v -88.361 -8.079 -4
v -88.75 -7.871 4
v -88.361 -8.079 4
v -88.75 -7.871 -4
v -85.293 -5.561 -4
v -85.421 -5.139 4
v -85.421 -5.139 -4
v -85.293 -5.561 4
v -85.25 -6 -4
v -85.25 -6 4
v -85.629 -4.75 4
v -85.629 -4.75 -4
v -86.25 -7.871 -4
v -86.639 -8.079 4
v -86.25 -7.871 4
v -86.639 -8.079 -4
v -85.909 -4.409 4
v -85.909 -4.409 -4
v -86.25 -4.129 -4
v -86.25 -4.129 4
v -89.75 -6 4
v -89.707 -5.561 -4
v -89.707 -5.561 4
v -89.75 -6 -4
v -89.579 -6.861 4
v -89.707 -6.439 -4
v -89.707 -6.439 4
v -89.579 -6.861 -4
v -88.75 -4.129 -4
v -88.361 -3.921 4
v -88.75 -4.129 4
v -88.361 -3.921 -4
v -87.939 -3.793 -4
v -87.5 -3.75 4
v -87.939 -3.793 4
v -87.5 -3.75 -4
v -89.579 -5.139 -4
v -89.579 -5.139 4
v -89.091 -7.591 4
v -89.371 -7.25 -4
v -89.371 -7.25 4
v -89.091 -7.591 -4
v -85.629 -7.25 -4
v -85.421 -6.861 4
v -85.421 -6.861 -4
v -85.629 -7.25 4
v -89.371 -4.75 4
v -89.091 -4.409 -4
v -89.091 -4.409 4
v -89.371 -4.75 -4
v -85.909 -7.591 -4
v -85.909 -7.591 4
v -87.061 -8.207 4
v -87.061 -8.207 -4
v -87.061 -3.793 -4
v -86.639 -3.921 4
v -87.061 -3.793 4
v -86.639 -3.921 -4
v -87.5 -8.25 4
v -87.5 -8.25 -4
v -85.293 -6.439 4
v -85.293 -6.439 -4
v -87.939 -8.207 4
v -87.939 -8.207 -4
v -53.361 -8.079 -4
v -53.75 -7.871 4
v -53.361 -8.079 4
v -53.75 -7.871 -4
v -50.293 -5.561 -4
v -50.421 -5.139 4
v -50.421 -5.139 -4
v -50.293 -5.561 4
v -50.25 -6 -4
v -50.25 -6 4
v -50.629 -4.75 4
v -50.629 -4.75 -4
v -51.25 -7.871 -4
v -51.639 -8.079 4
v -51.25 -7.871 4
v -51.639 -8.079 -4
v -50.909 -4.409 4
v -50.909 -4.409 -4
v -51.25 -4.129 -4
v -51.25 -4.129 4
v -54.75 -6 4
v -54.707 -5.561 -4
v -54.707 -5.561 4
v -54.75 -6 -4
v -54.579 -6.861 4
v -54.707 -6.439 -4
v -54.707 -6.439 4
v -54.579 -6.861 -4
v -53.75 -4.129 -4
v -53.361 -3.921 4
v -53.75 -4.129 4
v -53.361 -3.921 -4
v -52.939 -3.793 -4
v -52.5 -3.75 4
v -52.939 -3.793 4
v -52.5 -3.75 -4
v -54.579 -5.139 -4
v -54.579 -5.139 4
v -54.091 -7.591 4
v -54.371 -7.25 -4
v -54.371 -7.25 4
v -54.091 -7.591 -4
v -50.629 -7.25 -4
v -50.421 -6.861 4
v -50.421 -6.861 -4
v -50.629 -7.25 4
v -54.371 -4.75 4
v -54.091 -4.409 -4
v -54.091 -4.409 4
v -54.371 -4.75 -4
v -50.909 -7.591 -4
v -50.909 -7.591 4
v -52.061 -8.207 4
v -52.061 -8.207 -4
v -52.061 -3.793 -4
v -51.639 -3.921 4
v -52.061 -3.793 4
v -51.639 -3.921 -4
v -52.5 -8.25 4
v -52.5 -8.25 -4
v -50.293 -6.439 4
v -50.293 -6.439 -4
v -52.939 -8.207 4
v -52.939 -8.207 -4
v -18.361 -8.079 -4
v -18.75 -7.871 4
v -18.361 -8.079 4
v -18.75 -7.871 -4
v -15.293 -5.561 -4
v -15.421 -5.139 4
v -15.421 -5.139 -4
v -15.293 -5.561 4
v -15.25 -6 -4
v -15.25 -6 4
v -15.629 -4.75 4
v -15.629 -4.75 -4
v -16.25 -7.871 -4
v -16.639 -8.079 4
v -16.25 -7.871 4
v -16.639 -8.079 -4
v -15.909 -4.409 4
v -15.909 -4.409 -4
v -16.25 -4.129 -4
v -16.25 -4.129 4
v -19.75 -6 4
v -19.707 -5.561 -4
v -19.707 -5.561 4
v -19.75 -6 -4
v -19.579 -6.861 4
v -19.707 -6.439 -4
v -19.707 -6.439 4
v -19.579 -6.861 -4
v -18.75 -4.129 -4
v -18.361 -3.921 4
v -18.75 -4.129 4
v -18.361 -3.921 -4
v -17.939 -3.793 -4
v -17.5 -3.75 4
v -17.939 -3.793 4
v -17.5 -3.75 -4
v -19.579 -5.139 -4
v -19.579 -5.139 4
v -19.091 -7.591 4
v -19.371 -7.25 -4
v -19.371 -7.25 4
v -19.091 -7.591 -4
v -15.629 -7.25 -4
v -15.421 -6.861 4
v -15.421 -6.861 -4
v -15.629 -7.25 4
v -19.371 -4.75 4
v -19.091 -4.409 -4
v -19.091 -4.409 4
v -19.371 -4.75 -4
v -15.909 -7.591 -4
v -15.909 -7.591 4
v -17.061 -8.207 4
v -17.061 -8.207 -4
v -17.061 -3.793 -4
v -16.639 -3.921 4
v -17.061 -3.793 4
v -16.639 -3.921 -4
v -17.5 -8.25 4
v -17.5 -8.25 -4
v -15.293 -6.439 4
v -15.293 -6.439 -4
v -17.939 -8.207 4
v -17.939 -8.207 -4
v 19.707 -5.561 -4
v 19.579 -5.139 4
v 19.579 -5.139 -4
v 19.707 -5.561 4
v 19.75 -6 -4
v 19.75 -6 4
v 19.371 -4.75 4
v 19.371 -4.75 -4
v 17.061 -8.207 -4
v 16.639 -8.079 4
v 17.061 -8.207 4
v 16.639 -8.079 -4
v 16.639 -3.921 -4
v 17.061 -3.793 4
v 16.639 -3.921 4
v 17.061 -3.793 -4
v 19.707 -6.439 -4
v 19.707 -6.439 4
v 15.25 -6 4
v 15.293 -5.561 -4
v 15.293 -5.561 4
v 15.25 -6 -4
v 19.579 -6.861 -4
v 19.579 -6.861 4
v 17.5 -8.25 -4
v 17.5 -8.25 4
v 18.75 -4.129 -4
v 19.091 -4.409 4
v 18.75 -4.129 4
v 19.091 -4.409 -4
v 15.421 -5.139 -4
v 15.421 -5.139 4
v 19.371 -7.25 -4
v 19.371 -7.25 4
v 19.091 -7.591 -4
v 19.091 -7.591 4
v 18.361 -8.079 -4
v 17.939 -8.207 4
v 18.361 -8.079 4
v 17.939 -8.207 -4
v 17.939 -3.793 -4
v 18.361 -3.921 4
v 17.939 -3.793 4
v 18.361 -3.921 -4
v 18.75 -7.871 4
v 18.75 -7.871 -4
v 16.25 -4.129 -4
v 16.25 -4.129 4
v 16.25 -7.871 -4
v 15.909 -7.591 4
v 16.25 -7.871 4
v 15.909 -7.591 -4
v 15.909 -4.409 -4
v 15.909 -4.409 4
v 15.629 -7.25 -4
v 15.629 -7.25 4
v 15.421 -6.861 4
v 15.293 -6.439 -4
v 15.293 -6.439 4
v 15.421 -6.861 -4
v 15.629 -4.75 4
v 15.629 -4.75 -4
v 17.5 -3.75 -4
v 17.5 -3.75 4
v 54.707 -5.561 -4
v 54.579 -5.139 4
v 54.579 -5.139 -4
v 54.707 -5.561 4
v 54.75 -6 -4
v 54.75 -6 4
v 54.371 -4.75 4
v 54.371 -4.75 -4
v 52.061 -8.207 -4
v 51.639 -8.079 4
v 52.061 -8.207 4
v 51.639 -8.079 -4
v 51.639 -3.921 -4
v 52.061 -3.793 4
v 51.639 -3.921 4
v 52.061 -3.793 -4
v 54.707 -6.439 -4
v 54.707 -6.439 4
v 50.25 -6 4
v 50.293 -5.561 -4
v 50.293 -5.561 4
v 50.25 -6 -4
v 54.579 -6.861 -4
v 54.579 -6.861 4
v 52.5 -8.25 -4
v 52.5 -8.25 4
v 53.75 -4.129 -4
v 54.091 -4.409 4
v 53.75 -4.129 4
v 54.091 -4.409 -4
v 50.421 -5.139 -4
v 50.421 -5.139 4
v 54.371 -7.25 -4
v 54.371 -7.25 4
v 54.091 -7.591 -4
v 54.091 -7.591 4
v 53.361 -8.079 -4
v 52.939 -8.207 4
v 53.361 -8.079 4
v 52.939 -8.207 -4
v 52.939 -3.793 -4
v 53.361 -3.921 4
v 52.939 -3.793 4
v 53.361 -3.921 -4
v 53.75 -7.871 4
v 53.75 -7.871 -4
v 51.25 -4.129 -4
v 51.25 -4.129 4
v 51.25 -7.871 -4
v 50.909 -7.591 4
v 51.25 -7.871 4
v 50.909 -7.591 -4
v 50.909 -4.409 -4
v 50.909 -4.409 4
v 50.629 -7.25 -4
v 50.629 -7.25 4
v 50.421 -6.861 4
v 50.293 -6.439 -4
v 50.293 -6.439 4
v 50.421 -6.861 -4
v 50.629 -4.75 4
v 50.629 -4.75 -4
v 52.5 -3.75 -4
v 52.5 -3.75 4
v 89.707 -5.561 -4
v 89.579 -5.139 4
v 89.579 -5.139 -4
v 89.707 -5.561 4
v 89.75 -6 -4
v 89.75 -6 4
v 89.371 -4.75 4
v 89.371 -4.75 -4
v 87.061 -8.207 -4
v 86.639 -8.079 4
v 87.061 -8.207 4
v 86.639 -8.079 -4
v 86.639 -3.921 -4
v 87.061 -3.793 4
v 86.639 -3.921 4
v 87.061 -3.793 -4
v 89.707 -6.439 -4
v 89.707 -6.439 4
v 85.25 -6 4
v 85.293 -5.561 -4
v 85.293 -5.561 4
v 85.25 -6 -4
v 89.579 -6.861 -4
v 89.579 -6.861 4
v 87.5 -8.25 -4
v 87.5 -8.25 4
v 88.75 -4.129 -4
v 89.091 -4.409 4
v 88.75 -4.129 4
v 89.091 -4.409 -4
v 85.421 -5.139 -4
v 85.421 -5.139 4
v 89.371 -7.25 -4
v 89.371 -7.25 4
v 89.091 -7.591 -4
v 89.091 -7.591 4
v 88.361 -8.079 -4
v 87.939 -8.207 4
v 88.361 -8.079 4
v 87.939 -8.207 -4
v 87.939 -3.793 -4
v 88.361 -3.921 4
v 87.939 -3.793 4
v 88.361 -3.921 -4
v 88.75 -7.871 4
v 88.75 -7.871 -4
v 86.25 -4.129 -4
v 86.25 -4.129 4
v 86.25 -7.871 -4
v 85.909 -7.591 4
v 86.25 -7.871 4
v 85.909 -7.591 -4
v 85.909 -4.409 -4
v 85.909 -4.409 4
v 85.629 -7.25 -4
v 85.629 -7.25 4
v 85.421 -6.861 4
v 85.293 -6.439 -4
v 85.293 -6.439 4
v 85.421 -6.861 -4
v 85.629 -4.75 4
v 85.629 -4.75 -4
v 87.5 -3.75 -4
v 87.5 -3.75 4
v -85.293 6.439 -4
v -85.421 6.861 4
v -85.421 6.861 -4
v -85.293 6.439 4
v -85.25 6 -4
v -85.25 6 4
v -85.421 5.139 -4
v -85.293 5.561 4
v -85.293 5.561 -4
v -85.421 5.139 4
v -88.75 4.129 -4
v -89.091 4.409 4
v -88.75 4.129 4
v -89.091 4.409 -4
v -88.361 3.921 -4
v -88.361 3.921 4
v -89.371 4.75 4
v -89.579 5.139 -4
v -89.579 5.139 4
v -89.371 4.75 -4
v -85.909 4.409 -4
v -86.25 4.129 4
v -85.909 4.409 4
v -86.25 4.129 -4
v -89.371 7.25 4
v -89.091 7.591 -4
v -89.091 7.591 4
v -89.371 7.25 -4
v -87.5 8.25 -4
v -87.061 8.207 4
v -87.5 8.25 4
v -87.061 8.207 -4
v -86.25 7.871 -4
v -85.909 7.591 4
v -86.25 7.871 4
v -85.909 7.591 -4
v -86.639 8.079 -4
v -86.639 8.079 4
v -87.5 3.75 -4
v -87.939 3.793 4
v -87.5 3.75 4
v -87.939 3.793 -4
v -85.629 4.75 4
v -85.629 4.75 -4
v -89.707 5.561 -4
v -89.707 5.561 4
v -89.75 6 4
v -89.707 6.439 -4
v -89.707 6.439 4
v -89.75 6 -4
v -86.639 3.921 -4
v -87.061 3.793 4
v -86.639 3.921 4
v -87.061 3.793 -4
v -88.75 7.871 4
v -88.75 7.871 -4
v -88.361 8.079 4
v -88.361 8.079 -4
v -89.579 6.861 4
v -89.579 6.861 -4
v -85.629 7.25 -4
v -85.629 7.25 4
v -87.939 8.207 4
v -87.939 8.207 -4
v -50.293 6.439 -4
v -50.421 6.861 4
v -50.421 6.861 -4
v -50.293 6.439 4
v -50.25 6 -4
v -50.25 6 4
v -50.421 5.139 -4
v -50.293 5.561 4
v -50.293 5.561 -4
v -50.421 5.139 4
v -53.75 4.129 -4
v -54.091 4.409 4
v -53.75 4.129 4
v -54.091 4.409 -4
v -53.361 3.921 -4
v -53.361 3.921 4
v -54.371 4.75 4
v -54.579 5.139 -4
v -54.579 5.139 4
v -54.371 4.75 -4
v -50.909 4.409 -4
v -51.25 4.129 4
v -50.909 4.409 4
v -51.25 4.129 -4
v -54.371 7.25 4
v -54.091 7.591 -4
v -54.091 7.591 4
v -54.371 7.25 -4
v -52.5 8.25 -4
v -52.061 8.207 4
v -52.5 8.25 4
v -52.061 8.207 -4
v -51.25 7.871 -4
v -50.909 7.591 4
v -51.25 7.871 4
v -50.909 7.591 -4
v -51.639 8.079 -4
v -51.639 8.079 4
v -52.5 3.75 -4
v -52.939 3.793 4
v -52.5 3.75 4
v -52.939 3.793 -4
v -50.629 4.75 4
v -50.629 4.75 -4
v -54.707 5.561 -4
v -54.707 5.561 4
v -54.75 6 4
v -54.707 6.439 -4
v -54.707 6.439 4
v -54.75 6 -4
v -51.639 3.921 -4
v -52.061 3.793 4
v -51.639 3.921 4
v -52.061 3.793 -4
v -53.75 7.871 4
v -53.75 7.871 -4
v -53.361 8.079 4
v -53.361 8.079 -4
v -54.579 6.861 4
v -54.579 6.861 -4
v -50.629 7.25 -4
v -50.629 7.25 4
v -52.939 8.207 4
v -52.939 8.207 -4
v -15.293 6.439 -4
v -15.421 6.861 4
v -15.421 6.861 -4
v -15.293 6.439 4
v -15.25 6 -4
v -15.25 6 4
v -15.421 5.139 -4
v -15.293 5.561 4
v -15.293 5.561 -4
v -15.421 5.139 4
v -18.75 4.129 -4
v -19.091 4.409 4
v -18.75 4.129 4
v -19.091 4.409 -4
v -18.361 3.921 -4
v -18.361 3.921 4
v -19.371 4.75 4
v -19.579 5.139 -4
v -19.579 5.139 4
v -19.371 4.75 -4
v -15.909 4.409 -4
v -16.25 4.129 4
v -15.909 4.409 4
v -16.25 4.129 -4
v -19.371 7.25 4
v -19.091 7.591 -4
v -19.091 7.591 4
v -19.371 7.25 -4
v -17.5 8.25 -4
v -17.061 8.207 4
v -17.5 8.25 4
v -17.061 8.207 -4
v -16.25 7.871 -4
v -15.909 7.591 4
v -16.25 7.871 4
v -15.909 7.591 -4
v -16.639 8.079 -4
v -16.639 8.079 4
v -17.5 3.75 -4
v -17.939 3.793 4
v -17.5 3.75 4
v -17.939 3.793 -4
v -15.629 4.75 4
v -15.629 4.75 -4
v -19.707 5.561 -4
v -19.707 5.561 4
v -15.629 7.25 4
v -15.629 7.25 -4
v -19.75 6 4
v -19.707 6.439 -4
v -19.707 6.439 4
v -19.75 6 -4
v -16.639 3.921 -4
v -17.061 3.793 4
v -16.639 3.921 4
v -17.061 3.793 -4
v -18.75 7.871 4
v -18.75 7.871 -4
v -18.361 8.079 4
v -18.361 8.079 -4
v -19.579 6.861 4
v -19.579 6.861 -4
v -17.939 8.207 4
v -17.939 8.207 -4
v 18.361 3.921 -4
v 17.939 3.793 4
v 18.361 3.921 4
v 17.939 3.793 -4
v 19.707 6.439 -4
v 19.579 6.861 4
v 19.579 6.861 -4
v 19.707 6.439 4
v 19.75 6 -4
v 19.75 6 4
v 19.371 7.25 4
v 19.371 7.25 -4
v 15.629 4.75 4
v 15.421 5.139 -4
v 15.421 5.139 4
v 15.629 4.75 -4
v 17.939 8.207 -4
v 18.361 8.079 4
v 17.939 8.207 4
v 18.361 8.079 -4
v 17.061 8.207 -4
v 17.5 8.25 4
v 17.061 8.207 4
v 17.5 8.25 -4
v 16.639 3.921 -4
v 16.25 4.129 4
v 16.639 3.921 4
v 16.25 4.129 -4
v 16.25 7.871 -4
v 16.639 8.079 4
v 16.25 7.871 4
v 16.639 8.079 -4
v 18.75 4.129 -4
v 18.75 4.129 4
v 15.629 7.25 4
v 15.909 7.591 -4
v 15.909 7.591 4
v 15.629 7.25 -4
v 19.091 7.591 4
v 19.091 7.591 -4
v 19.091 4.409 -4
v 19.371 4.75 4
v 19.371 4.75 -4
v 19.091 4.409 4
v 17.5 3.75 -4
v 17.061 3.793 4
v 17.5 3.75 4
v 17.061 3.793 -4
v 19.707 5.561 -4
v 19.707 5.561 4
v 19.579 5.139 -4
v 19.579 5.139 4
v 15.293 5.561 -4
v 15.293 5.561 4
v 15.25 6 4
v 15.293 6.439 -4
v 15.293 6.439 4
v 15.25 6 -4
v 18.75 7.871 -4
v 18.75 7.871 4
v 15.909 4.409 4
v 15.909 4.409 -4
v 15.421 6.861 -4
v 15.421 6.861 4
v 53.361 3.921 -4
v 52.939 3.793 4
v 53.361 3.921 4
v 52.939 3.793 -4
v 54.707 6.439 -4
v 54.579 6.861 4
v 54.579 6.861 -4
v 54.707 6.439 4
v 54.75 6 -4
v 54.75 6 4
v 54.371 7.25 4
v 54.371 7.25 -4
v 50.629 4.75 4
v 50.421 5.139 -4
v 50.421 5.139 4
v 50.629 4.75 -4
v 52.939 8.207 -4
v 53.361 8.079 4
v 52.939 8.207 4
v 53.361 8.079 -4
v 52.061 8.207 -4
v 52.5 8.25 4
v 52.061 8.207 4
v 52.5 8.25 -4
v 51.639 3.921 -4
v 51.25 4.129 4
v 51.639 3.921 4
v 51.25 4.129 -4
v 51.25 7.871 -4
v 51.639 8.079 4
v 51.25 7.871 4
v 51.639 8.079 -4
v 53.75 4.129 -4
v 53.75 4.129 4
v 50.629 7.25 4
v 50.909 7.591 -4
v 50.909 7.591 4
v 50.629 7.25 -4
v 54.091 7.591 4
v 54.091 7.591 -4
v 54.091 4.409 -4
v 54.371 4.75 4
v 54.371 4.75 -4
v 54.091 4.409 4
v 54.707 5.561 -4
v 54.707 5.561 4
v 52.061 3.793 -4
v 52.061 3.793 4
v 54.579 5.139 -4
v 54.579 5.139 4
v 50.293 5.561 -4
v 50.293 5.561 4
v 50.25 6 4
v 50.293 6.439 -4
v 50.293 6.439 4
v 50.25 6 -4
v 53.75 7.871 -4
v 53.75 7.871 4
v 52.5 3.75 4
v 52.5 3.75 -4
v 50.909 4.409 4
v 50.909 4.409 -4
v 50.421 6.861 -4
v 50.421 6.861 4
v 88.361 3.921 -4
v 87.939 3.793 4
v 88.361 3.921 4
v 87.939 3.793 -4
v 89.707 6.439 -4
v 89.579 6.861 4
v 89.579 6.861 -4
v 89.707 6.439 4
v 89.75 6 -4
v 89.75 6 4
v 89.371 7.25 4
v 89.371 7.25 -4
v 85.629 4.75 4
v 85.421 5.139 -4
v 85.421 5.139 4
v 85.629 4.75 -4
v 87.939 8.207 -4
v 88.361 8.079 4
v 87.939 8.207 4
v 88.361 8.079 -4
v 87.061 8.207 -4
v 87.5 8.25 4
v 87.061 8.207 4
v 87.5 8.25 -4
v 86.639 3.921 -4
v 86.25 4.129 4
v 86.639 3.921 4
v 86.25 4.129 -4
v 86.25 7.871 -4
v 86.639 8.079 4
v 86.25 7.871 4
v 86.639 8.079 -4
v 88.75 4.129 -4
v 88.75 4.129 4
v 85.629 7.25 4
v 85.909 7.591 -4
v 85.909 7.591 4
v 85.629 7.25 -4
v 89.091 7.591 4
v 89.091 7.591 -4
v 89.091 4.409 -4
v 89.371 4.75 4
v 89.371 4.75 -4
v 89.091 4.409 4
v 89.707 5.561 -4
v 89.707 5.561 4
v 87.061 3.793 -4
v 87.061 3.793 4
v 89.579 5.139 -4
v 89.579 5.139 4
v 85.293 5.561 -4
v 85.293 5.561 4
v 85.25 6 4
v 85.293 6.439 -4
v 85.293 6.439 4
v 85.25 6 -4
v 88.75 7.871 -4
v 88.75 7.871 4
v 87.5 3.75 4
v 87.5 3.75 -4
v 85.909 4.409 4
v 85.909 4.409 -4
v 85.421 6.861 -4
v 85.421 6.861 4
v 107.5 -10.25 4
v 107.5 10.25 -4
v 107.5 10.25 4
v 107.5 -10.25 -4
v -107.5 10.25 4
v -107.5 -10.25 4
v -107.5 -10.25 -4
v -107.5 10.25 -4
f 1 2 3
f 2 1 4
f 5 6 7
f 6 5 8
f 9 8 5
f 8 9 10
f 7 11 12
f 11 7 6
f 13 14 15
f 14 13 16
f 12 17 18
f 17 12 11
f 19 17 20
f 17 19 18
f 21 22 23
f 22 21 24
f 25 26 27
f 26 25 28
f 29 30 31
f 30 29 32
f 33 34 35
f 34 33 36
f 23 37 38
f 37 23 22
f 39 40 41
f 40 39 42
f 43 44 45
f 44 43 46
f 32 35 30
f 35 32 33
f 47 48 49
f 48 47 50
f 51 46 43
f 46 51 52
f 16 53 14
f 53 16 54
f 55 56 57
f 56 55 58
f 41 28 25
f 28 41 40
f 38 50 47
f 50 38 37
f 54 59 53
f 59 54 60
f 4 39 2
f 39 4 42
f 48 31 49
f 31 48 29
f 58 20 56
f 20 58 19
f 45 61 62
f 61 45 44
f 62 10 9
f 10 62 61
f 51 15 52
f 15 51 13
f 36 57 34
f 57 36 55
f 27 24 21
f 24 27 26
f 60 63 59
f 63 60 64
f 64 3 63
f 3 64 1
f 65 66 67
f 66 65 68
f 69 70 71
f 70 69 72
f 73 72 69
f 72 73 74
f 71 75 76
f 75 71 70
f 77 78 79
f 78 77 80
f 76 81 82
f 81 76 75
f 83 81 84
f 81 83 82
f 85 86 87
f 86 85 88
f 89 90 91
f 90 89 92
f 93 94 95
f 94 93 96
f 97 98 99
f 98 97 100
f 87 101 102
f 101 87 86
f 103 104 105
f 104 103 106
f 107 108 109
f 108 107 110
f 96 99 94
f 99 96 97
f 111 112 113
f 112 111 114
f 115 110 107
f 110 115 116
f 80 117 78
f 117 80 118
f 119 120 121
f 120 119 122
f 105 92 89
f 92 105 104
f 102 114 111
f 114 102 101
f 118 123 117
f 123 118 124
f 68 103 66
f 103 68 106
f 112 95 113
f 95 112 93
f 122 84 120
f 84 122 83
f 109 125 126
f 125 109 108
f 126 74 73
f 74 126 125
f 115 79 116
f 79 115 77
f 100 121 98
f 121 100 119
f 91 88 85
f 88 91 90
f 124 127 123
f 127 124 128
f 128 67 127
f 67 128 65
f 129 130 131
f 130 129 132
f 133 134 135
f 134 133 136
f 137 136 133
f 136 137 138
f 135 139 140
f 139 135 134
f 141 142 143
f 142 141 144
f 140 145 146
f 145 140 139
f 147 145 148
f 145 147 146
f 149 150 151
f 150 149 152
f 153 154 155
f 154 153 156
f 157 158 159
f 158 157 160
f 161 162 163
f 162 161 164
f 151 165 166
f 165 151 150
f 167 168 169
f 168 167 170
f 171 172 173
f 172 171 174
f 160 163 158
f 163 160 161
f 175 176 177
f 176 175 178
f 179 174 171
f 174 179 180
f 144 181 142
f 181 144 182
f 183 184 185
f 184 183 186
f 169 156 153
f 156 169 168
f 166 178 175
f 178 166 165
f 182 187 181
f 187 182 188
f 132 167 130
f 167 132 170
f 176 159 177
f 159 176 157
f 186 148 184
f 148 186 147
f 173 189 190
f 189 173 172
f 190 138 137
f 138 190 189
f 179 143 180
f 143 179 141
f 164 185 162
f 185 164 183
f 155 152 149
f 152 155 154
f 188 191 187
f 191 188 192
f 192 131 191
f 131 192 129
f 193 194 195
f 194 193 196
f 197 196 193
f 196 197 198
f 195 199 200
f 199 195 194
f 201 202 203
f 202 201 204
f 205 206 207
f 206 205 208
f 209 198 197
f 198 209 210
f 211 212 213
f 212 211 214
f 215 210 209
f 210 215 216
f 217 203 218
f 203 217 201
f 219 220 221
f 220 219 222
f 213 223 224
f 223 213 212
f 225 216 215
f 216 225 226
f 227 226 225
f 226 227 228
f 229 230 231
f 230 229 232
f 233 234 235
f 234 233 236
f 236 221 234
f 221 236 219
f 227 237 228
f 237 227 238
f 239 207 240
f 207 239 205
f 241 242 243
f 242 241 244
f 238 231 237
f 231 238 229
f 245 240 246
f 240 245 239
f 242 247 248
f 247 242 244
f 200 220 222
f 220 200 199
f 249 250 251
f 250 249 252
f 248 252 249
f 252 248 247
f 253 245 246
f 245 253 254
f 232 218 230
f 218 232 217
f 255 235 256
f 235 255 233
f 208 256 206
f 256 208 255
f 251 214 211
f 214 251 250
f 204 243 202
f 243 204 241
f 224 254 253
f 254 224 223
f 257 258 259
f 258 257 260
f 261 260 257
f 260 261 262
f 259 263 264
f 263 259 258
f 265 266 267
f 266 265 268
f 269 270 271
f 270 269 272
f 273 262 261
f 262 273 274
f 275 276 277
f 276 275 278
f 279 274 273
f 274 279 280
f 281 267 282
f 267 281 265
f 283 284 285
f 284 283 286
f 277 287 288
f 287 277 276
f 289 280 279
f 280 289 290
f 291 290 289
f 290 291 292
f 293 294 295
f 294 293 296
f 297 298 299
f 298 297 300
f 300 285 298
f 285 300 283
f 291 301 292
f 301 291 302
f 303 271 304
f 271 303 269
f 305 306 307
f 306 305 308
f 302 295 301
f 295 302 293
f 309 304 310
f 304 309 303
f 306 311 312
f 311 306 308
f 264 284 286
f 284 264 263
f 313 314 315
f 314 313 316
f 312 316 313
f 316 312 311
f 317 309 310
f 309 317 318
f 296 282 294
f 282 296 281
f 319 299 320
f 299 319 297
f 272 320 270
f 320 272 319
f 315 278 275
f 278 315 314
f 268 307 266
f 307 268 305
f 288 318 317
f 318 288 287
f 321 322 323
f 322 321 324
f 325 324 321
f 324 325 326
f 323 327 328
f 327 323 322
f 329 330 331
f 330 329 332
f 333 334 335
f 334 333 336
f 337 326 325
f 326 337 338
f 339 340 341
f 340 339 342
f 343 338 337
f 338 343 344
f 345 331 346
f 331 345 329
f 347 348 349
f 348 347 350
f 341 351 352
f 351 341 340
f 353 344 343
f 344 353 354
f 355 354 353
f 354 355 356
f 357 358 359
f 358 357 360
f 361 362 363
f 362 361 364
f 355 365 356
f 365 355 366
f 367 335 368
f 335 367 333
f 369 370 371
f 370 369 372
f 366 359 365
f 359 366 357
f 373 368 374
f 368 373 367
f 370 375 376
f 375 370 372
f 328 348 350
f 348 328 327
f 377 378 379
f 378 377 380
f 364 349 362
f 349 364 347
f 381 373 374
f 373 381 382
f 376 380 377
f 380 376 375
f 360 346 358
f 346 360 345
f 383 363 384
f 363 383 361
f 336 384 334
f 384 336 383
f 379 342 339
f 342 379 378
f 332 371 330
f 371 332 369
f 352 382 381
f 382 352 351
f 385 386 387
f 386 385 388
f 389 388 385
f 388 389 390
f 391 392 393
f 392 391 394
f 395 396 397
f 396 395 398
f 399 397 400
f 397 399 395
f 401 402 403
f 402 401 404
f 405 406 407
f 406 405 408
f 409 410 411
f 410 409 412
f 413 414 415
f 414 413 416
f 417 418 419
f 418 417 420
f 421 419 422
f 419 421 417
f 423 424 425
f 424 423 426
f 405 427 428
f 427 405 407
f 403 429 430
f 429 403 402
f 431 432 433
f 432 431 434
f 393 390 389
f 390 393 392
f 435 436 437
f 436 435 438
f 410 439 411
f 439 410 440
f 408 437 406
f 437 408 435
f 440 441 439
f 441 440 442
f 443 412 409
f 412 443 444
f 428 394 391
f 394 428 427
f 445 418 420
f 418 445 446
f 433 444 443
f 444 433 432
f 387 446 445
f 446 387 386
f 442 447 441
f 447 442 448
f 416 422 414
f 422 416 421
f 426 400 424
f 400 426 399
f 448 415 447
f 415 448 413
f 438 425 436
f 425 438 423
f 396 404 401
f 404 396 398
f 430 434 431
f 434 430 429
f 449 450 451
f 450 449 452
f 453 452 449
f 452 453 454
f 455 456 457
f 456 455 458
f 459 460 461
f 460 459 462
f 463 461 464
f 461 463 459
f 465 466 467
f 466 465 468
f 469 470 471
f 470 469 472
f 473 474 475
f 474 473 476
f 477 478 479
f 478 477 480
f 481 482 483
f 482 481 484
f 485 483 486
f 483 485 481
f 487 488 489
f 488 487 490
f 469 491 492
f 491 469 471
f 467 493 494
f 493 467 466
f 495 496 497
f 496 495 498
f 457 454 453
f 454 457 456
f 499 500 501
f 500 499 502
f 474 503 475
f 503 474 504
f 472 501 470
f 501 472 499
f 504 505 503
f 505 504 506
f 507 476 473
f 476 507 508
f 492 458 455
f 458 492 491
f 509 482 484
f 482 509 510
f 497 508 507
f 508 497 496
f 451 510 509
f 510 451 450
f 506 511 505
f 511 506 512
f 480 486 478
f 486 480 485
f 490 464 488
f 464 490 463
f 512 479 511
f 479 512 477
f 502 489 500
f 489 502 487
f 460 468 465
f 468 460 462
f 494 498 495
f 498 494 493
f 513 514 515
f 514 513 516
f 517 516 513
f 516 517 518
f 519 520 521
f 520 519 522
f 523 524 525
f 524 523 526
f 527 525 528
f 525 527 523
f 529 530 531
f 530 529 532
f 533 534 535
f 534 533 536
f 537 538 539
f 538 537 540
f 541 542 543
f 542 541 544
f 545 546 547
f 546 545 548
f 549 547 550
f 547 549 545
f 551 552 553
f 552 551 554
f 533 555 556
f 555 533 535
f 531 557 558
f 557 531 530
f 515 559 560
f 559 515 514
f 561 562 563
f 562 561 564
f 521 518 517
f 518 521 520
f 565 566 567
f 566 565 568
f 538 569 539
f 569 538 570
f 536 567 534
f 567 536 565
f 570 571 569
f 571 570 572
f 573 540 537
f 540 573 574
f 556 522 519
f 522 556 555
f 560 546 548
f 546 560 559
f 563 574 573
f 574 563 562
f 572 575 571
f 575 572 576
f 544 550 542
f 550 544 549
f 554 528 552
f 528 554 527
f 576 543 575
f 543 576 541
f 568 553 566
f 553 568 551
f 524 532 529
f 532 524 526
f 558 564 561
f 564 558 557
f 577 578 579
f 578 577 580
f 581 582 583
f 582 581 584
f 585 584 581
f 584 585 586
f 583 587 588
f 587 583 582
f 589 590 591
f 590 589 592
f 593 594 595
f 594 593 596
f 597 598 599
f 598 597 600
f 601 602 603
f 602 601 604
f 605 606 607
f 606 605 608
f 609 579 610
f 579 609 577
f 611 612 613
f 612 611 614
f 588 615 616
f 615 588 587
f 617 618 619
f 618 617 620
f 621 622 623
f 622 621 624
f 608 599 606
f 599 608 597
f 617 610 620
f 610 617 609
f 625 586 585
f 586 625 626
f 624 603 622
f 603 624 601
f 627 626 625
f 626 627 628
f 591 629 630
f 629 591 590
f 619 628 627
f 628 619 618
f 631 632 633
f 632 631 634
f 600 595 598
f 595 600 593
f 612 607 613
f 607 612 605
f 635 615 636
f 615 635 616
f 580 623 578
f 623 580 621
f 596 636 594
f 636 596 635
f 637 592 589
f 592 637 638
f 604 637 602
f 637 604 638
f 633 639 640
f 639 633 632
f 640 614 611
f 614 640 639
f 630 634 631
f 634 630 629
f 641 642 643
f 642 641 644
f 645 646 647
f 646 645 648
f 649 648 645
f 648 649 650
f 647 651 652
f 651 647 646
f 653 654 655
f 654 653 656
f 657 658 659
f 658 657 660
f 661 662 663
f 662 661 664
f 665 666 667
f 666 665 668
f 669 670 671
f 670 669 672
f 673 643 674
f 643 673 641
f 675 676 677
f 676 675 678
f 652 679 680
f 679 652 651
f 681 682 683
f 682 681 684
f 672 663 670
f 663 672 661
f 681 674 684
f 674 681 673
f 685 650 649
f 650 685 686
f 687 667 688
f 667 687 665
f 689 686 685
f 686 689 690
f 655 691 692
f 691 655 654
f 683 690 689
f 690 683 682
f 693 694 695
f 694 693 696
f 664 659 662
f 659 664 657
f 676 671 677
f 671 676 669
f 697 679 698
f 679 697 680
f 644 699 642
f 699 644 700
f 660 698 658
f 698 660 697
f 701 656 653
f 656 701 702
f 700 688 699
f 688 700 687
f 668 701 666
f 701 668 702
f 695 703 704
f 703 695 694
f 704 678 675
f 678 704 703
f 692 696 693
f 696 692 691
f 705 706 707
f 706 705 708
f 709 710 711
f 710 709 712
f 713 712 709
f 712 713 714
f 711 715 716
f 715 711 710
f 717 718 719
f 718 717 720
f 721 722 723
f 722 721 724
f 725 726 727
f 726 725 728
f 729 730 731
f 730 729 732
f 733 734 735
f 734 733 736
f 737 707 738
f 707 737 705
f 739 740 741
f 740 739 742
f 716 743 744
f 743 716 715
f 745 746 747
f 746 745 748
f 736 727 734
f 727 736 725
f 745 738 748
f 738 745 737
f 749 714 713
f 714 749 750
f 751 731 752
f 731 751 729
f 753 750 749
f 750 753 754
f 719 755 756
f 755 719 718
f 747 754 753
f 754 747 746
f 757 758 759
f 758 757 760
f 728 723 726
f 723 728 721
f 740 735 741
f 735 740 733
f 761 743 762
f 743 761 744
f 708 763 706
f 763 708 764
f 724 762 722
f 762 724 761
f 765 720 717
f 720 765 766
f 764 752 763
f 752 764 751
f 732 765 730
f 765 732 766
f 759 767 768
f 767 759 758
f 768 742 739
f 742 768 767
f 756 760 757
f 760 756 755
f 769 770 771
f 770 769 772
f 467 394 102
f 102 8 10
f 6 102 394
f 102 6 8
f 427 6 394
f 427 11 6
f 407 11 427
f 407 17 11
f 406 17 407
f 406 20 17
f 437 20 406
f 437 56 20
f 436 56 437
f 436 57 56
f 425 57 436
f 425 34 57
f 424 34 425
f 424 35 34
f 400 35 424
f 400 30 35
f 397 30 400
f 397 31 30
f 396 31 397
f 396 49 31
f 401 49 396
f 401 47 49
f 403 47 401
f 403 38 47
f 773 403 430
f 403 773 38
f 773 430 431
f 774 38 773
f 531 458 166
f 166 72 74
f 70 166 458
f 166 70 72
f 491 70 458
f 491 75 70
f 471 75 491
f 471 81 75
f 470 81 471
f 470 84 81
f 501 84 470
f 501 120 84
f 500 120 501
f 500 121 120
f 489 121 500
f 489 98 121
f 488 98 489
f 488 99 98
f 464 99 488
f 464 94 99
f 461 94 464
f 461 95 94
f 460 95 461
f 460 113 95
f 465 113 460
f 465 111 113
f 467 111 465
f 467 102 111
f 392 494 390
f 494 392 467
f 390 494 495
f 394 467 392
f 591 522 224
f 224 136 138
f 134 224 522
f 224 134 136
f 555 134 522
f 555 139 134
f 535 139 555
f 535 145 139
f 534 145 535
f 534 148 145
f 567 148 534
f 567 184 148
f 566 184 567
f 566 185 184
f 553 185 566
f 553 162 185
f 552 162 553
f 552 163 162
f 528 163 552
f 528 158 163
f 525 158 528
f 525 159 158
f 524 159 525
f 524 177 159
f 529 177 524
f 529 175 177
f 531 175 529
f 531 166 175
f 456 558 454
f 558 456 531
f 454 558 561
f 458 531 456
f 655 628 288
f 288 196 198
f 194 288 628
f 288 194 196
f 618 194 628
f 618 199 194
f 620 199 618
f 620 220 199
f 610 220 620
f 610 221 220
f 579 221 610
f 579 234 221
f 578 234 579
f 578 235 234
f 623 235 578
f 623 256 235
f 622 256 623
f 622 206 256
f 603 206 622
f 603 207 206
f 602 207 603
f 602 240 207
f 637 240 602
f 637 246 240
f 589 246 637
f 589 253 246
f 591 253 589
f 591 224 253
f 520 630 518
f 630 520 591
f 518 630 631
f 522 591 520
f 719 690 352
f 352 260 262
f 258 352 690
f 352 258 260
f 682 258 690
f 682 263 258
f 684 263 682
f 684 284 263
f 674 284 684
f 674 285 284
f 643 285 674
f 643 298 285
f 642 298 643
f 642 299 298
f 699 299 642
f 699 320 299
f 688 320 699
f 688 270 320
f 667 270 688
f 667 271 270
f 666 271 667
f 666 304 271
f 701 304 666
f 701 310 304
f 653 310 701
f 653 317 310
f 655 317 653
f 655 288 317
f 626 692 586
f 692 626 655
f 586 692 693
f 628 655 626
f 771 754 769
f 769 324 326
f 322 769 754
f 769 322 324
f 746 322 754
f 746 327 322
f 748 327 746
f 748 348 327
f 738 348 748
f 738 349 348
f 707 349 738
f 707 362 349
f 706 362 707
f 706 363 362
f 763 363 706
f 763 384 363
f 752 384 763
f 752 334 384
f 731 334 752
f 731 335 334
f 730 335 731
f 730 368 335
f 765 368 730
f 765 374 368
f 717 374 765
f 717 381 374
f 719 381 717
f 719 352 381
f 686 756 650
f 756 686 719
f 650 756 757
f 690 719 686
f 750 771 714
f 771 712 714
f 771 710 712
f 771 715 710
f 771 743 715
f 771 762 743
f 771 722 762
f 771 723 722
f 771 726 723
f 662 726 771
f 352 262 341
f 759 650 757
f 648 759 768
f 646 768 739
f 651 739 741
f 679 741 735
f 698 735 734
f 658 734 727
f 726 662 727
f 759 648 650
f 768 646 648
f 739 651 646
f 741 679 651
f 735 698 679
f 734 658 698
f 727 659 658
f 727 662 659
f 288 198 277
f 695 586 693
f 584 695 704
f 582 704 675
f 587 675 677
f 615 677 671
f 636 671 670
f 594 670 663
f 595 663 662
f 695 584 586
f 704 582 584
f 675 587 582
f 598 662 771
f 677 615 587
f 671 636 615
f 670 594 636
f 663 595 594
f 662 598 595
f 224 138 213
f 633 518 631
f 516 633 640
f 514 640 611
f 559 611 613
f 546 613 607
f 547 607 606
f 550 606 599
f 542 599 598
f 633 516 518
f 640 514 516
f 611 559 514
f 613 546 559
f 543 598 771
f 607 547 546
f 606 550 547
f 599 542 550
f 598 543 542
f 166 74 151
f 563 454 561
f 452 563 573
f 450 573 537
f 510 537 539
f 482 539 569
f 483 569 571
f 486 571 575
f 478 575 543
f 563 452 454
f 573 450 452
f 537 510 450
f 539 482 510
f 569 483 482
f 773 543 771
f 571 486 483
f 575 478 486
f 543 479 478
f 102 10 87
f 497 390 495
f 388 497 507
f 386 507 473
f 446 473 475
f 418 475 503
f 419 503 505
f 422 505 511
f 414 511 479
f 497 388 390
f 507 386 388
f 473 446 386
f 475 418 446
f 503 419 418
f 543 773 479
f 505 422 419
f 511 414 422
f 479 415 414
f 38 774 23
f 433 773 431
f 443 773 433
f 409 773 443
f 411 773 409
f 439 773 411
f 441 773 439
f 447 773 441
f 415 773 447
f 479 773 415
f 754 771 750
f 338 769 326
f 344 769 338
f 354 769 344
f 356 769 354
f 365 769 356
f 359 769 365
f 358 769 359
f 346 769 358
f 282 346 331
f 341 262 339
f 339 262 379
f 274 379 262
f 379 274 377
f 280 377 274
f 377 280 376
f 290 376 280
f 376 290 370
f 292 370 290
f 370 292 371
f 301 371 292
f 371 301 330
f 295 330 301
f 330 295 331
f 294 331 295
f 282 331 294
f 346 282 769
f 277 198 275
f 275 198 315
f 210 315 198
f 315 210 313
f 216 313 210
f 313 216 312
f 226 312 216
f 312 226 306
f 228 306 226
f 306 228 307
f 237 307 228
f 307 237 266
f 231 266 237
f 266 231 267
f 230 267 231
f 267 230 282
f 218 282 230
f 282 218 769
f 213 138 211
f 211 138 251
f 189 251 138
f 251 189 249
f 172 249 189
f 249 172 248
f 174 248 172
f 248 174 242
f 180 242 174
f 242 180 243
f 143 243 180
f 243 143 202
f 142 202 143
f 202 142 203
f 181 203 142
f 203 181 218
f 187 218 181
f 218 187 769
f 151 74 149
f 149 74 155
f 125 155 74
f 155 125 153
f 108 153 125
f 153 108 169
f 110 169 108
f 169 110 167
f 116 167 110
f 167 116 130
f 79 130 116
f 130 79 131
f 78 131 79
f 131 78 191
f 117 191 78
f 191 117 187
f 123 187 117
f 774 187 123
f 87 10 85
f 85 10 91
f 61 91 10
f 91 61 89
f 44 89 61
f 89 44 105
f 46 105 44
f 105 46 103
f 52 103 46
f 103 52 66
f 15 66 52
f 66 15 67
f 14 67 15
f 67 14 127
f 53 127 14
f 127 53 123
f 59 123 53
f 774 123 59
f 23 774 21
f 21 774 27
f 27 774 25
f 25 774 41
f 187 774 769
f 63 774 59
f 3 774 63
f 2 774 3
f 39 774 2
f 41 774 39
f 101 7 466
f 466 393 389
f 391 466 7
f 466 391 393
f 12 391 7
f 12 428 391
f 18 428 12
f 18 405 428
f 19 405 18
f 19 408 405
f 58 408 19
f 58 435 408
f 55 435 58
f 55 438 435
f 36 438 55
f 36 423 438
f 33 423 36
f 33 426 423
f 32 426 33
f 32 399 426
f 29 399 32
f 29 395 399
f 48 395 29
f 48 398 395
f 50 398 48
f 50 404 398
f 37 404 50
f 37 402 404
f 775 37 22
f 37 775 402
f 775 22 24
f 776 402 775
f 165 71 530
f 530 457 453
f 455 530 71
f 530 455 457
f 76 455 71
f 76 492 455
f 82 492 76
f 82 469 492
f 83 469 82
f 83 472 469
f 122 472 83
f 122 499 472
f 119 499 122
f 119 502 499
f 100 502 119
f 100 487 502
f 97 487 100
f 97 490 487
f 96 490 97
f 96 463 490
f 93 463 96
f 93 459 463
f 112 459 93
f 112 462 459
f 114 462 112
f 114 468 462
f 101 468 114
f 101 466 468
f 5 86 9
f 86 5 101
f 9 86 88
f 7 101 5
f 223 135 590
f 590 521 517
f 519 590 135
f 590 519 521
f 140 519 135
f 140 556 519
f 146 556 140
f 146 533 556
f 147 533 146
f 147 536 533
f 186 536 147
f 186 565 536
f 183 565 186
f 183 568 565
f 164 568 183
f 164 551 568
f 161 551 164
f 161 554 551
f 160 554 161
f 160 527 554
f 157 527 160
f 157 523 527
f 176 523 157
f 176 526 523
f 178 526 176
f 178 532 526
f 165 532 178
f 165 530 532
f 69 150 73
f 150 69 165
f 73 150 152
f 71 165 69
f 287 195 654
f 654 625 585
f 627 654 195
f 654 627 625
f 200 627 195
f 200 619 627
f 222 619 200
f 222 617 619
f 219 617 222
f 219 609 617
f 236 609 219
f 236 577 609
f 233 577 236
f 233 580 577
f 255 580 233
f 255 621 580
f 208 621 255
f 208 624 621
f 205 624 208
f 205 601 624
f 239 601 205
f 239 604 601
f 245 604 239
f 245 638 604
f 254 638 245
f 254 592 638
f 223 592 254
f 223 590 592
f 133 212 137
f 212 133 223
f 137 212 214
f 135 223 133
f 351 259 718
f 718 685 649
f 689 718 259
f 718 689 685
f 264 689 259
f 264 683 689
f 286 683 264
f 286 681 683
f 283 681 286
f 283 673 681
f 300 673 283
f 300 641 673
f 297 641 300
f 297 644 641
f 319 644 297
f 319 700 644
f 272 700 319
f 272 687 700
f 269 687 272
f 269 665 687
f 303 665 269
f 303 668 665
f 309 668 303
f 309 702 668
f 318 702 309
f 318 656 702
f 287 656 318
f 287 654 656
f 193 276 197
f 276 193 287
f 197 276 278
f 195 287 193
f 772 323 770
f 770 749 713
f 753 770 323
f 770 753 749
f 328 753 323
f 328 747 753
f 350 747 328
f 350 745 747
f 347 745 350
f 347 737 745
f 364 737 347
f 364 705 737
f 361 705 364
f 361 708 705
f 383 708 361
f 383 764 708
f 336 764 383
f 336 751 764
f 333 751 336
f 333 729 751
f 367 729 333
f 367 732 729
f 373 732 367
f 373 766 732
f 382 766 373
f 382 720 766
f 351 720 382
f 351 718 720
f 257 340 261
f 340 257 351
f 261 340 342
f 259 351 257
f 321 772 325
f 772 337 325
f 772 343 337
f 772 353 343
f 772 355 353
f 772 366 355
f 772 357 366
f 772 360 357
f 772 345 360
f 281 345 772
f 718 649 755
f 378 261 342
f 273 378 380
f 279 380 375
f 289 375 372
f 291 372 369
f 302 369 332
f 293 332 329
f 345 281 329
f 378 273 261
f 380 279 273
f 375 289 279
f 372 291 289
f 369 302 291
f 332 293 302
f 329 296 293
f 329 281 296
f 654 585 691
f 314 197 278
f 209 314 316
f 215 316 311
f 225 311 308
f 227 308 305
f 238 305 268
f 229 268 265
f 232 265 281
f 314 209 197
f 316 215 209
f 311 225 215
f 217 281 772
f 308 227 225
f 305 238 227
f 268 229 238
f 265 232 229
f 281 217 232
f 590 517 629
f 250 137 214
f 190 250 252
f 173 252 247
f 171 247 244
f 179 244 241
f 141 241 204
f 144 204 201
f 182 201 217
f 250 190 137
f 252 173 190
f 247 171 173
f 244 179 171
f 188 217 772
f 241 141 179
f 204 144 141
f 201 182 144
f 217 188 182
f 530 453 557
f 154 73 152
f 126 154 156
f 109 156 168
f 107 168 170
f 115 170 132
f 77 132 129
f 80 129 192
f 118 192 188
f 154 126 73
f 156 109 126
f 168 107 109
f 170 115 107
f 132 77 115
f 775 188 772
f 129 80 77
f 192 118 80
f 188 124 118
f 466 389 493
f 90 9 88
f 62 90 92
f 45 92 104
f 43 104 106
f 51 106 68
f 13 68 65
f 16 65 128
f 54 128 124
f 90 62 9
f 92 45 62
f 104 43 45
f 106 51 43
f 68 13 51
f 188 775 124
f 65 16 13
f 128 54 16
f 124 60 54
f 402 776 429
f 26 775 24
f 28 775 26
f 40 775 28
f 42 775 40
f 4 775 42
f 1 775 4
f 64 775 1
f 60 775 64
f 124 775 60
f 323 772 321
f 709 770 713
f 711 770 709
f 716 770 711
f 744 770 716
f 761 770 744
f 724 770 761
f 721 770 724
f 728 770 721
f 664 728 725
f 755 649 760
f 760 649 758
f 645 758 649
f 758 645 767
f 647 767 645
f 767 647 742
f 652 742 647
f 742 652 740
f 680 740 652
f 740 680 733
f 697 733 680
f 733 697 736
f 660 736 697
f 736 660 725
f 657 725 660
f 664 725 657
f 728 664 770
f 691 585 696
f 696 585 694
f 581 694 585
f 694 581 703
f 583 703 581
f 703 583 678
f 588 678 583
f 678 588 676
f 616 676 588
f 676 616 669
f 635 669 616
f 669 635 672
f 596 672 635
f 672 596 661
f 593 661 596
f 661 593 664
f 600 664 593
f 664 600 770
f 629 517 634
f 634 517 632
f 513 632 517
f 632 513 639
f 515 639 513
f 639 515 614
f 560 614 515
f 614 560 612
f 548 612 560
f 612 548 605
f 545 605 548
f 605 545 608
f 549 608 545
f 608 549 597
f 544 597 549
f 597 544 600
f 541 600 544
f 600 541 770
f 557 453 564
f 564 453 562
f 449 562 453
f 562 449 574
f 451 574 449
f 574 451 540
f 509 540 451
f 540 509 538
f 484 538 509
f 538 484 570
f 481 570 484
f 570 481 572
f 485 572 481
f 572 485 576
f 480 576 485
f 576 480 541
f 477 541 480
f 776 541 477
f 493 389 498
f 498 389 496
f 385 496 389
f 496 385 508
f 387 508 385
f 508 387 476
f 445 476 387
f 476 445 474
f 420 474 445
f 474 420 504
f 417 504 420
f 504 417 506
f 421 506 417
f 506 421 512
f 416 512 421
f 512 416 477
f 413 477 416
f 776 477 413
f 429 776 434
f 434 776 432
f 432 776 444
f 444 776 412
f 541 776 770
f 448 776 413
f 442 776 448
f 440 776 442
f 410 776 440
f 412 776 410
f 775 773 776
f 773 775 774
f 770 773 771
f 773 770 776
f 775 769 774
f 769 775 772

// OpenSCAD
$fn = 32;

// ----------------------------------------------------------------------
// Hole bar, 6 x Ø4.5
// tworows layout, 20 mm edge offset
// ----------------------------------------------------------------------

// --- parameters (mm) ---
bar_w = 20.5;     // bar width (Y)
bar_t = 8;        // bar thickness (Z)
holes = 6;        // holes per row
hole_d = 4.5;     // hole diameter
edge = 20;        // offset from the bar end to the first hole
pitch = 35;       // pitch between neighbouring holes
row_offset = 12;  // distance between the two rows

// --- derived feature positions (mm) ---
span = (holes - 1) * pitch;   // = 175   distance between the end holes
bar_l = span + 2 * edge;      // = 215   overall bar length
start_x = -bar_l / 2 + edge;  // = -87.5   X of the first hole
feature_centers = [
  [start_x + 0 * pitch, -row_offset / 2],
  [start_x + 1 * pitch, -row_offset / 2],
  [start_x + 2 * pitch, -row_offset / 2],
  [start_x + 3 * pitch, -row_offset / 2],
  [start_x + 4 * pitch, -row_offset / 2],
  [start_x + 5 * pitch, -row_offset / 2]
];   // hole centres of the first row
row2_centers = [
  [start_x + 0 * pitch, row_offset / 2],
  [start_x + 1 * pitch, row_offset / 2],
  [start_x + 2 * pitch, row_offset / 2],
  [start_x + 3 * pitch, row_offset / 2],
  [start_x + 4 * pitch, row_offset / 2],
  [start_x + 5 * pitch, row_offset / 2]
];   // hole centres of the second row

// bar with two rows of holes, both read from their own centre arrays
difference() {
  translate([-bar_l / 2, -bar_w / 2, -bar_t / 2]) cube([bar_l, bar_w, bar_t]);
  for (centre = feature_centers)
    translate([centre[0], centre[1], 0])
      cylinder(d = hole_d, h = bar_t + 2, center = true);
  for (centre = row2_centers)
    translate([centre[0], centre[1], 0])
      cylinder(d = hole_d, h = bar_t + 2, center = true);
}
